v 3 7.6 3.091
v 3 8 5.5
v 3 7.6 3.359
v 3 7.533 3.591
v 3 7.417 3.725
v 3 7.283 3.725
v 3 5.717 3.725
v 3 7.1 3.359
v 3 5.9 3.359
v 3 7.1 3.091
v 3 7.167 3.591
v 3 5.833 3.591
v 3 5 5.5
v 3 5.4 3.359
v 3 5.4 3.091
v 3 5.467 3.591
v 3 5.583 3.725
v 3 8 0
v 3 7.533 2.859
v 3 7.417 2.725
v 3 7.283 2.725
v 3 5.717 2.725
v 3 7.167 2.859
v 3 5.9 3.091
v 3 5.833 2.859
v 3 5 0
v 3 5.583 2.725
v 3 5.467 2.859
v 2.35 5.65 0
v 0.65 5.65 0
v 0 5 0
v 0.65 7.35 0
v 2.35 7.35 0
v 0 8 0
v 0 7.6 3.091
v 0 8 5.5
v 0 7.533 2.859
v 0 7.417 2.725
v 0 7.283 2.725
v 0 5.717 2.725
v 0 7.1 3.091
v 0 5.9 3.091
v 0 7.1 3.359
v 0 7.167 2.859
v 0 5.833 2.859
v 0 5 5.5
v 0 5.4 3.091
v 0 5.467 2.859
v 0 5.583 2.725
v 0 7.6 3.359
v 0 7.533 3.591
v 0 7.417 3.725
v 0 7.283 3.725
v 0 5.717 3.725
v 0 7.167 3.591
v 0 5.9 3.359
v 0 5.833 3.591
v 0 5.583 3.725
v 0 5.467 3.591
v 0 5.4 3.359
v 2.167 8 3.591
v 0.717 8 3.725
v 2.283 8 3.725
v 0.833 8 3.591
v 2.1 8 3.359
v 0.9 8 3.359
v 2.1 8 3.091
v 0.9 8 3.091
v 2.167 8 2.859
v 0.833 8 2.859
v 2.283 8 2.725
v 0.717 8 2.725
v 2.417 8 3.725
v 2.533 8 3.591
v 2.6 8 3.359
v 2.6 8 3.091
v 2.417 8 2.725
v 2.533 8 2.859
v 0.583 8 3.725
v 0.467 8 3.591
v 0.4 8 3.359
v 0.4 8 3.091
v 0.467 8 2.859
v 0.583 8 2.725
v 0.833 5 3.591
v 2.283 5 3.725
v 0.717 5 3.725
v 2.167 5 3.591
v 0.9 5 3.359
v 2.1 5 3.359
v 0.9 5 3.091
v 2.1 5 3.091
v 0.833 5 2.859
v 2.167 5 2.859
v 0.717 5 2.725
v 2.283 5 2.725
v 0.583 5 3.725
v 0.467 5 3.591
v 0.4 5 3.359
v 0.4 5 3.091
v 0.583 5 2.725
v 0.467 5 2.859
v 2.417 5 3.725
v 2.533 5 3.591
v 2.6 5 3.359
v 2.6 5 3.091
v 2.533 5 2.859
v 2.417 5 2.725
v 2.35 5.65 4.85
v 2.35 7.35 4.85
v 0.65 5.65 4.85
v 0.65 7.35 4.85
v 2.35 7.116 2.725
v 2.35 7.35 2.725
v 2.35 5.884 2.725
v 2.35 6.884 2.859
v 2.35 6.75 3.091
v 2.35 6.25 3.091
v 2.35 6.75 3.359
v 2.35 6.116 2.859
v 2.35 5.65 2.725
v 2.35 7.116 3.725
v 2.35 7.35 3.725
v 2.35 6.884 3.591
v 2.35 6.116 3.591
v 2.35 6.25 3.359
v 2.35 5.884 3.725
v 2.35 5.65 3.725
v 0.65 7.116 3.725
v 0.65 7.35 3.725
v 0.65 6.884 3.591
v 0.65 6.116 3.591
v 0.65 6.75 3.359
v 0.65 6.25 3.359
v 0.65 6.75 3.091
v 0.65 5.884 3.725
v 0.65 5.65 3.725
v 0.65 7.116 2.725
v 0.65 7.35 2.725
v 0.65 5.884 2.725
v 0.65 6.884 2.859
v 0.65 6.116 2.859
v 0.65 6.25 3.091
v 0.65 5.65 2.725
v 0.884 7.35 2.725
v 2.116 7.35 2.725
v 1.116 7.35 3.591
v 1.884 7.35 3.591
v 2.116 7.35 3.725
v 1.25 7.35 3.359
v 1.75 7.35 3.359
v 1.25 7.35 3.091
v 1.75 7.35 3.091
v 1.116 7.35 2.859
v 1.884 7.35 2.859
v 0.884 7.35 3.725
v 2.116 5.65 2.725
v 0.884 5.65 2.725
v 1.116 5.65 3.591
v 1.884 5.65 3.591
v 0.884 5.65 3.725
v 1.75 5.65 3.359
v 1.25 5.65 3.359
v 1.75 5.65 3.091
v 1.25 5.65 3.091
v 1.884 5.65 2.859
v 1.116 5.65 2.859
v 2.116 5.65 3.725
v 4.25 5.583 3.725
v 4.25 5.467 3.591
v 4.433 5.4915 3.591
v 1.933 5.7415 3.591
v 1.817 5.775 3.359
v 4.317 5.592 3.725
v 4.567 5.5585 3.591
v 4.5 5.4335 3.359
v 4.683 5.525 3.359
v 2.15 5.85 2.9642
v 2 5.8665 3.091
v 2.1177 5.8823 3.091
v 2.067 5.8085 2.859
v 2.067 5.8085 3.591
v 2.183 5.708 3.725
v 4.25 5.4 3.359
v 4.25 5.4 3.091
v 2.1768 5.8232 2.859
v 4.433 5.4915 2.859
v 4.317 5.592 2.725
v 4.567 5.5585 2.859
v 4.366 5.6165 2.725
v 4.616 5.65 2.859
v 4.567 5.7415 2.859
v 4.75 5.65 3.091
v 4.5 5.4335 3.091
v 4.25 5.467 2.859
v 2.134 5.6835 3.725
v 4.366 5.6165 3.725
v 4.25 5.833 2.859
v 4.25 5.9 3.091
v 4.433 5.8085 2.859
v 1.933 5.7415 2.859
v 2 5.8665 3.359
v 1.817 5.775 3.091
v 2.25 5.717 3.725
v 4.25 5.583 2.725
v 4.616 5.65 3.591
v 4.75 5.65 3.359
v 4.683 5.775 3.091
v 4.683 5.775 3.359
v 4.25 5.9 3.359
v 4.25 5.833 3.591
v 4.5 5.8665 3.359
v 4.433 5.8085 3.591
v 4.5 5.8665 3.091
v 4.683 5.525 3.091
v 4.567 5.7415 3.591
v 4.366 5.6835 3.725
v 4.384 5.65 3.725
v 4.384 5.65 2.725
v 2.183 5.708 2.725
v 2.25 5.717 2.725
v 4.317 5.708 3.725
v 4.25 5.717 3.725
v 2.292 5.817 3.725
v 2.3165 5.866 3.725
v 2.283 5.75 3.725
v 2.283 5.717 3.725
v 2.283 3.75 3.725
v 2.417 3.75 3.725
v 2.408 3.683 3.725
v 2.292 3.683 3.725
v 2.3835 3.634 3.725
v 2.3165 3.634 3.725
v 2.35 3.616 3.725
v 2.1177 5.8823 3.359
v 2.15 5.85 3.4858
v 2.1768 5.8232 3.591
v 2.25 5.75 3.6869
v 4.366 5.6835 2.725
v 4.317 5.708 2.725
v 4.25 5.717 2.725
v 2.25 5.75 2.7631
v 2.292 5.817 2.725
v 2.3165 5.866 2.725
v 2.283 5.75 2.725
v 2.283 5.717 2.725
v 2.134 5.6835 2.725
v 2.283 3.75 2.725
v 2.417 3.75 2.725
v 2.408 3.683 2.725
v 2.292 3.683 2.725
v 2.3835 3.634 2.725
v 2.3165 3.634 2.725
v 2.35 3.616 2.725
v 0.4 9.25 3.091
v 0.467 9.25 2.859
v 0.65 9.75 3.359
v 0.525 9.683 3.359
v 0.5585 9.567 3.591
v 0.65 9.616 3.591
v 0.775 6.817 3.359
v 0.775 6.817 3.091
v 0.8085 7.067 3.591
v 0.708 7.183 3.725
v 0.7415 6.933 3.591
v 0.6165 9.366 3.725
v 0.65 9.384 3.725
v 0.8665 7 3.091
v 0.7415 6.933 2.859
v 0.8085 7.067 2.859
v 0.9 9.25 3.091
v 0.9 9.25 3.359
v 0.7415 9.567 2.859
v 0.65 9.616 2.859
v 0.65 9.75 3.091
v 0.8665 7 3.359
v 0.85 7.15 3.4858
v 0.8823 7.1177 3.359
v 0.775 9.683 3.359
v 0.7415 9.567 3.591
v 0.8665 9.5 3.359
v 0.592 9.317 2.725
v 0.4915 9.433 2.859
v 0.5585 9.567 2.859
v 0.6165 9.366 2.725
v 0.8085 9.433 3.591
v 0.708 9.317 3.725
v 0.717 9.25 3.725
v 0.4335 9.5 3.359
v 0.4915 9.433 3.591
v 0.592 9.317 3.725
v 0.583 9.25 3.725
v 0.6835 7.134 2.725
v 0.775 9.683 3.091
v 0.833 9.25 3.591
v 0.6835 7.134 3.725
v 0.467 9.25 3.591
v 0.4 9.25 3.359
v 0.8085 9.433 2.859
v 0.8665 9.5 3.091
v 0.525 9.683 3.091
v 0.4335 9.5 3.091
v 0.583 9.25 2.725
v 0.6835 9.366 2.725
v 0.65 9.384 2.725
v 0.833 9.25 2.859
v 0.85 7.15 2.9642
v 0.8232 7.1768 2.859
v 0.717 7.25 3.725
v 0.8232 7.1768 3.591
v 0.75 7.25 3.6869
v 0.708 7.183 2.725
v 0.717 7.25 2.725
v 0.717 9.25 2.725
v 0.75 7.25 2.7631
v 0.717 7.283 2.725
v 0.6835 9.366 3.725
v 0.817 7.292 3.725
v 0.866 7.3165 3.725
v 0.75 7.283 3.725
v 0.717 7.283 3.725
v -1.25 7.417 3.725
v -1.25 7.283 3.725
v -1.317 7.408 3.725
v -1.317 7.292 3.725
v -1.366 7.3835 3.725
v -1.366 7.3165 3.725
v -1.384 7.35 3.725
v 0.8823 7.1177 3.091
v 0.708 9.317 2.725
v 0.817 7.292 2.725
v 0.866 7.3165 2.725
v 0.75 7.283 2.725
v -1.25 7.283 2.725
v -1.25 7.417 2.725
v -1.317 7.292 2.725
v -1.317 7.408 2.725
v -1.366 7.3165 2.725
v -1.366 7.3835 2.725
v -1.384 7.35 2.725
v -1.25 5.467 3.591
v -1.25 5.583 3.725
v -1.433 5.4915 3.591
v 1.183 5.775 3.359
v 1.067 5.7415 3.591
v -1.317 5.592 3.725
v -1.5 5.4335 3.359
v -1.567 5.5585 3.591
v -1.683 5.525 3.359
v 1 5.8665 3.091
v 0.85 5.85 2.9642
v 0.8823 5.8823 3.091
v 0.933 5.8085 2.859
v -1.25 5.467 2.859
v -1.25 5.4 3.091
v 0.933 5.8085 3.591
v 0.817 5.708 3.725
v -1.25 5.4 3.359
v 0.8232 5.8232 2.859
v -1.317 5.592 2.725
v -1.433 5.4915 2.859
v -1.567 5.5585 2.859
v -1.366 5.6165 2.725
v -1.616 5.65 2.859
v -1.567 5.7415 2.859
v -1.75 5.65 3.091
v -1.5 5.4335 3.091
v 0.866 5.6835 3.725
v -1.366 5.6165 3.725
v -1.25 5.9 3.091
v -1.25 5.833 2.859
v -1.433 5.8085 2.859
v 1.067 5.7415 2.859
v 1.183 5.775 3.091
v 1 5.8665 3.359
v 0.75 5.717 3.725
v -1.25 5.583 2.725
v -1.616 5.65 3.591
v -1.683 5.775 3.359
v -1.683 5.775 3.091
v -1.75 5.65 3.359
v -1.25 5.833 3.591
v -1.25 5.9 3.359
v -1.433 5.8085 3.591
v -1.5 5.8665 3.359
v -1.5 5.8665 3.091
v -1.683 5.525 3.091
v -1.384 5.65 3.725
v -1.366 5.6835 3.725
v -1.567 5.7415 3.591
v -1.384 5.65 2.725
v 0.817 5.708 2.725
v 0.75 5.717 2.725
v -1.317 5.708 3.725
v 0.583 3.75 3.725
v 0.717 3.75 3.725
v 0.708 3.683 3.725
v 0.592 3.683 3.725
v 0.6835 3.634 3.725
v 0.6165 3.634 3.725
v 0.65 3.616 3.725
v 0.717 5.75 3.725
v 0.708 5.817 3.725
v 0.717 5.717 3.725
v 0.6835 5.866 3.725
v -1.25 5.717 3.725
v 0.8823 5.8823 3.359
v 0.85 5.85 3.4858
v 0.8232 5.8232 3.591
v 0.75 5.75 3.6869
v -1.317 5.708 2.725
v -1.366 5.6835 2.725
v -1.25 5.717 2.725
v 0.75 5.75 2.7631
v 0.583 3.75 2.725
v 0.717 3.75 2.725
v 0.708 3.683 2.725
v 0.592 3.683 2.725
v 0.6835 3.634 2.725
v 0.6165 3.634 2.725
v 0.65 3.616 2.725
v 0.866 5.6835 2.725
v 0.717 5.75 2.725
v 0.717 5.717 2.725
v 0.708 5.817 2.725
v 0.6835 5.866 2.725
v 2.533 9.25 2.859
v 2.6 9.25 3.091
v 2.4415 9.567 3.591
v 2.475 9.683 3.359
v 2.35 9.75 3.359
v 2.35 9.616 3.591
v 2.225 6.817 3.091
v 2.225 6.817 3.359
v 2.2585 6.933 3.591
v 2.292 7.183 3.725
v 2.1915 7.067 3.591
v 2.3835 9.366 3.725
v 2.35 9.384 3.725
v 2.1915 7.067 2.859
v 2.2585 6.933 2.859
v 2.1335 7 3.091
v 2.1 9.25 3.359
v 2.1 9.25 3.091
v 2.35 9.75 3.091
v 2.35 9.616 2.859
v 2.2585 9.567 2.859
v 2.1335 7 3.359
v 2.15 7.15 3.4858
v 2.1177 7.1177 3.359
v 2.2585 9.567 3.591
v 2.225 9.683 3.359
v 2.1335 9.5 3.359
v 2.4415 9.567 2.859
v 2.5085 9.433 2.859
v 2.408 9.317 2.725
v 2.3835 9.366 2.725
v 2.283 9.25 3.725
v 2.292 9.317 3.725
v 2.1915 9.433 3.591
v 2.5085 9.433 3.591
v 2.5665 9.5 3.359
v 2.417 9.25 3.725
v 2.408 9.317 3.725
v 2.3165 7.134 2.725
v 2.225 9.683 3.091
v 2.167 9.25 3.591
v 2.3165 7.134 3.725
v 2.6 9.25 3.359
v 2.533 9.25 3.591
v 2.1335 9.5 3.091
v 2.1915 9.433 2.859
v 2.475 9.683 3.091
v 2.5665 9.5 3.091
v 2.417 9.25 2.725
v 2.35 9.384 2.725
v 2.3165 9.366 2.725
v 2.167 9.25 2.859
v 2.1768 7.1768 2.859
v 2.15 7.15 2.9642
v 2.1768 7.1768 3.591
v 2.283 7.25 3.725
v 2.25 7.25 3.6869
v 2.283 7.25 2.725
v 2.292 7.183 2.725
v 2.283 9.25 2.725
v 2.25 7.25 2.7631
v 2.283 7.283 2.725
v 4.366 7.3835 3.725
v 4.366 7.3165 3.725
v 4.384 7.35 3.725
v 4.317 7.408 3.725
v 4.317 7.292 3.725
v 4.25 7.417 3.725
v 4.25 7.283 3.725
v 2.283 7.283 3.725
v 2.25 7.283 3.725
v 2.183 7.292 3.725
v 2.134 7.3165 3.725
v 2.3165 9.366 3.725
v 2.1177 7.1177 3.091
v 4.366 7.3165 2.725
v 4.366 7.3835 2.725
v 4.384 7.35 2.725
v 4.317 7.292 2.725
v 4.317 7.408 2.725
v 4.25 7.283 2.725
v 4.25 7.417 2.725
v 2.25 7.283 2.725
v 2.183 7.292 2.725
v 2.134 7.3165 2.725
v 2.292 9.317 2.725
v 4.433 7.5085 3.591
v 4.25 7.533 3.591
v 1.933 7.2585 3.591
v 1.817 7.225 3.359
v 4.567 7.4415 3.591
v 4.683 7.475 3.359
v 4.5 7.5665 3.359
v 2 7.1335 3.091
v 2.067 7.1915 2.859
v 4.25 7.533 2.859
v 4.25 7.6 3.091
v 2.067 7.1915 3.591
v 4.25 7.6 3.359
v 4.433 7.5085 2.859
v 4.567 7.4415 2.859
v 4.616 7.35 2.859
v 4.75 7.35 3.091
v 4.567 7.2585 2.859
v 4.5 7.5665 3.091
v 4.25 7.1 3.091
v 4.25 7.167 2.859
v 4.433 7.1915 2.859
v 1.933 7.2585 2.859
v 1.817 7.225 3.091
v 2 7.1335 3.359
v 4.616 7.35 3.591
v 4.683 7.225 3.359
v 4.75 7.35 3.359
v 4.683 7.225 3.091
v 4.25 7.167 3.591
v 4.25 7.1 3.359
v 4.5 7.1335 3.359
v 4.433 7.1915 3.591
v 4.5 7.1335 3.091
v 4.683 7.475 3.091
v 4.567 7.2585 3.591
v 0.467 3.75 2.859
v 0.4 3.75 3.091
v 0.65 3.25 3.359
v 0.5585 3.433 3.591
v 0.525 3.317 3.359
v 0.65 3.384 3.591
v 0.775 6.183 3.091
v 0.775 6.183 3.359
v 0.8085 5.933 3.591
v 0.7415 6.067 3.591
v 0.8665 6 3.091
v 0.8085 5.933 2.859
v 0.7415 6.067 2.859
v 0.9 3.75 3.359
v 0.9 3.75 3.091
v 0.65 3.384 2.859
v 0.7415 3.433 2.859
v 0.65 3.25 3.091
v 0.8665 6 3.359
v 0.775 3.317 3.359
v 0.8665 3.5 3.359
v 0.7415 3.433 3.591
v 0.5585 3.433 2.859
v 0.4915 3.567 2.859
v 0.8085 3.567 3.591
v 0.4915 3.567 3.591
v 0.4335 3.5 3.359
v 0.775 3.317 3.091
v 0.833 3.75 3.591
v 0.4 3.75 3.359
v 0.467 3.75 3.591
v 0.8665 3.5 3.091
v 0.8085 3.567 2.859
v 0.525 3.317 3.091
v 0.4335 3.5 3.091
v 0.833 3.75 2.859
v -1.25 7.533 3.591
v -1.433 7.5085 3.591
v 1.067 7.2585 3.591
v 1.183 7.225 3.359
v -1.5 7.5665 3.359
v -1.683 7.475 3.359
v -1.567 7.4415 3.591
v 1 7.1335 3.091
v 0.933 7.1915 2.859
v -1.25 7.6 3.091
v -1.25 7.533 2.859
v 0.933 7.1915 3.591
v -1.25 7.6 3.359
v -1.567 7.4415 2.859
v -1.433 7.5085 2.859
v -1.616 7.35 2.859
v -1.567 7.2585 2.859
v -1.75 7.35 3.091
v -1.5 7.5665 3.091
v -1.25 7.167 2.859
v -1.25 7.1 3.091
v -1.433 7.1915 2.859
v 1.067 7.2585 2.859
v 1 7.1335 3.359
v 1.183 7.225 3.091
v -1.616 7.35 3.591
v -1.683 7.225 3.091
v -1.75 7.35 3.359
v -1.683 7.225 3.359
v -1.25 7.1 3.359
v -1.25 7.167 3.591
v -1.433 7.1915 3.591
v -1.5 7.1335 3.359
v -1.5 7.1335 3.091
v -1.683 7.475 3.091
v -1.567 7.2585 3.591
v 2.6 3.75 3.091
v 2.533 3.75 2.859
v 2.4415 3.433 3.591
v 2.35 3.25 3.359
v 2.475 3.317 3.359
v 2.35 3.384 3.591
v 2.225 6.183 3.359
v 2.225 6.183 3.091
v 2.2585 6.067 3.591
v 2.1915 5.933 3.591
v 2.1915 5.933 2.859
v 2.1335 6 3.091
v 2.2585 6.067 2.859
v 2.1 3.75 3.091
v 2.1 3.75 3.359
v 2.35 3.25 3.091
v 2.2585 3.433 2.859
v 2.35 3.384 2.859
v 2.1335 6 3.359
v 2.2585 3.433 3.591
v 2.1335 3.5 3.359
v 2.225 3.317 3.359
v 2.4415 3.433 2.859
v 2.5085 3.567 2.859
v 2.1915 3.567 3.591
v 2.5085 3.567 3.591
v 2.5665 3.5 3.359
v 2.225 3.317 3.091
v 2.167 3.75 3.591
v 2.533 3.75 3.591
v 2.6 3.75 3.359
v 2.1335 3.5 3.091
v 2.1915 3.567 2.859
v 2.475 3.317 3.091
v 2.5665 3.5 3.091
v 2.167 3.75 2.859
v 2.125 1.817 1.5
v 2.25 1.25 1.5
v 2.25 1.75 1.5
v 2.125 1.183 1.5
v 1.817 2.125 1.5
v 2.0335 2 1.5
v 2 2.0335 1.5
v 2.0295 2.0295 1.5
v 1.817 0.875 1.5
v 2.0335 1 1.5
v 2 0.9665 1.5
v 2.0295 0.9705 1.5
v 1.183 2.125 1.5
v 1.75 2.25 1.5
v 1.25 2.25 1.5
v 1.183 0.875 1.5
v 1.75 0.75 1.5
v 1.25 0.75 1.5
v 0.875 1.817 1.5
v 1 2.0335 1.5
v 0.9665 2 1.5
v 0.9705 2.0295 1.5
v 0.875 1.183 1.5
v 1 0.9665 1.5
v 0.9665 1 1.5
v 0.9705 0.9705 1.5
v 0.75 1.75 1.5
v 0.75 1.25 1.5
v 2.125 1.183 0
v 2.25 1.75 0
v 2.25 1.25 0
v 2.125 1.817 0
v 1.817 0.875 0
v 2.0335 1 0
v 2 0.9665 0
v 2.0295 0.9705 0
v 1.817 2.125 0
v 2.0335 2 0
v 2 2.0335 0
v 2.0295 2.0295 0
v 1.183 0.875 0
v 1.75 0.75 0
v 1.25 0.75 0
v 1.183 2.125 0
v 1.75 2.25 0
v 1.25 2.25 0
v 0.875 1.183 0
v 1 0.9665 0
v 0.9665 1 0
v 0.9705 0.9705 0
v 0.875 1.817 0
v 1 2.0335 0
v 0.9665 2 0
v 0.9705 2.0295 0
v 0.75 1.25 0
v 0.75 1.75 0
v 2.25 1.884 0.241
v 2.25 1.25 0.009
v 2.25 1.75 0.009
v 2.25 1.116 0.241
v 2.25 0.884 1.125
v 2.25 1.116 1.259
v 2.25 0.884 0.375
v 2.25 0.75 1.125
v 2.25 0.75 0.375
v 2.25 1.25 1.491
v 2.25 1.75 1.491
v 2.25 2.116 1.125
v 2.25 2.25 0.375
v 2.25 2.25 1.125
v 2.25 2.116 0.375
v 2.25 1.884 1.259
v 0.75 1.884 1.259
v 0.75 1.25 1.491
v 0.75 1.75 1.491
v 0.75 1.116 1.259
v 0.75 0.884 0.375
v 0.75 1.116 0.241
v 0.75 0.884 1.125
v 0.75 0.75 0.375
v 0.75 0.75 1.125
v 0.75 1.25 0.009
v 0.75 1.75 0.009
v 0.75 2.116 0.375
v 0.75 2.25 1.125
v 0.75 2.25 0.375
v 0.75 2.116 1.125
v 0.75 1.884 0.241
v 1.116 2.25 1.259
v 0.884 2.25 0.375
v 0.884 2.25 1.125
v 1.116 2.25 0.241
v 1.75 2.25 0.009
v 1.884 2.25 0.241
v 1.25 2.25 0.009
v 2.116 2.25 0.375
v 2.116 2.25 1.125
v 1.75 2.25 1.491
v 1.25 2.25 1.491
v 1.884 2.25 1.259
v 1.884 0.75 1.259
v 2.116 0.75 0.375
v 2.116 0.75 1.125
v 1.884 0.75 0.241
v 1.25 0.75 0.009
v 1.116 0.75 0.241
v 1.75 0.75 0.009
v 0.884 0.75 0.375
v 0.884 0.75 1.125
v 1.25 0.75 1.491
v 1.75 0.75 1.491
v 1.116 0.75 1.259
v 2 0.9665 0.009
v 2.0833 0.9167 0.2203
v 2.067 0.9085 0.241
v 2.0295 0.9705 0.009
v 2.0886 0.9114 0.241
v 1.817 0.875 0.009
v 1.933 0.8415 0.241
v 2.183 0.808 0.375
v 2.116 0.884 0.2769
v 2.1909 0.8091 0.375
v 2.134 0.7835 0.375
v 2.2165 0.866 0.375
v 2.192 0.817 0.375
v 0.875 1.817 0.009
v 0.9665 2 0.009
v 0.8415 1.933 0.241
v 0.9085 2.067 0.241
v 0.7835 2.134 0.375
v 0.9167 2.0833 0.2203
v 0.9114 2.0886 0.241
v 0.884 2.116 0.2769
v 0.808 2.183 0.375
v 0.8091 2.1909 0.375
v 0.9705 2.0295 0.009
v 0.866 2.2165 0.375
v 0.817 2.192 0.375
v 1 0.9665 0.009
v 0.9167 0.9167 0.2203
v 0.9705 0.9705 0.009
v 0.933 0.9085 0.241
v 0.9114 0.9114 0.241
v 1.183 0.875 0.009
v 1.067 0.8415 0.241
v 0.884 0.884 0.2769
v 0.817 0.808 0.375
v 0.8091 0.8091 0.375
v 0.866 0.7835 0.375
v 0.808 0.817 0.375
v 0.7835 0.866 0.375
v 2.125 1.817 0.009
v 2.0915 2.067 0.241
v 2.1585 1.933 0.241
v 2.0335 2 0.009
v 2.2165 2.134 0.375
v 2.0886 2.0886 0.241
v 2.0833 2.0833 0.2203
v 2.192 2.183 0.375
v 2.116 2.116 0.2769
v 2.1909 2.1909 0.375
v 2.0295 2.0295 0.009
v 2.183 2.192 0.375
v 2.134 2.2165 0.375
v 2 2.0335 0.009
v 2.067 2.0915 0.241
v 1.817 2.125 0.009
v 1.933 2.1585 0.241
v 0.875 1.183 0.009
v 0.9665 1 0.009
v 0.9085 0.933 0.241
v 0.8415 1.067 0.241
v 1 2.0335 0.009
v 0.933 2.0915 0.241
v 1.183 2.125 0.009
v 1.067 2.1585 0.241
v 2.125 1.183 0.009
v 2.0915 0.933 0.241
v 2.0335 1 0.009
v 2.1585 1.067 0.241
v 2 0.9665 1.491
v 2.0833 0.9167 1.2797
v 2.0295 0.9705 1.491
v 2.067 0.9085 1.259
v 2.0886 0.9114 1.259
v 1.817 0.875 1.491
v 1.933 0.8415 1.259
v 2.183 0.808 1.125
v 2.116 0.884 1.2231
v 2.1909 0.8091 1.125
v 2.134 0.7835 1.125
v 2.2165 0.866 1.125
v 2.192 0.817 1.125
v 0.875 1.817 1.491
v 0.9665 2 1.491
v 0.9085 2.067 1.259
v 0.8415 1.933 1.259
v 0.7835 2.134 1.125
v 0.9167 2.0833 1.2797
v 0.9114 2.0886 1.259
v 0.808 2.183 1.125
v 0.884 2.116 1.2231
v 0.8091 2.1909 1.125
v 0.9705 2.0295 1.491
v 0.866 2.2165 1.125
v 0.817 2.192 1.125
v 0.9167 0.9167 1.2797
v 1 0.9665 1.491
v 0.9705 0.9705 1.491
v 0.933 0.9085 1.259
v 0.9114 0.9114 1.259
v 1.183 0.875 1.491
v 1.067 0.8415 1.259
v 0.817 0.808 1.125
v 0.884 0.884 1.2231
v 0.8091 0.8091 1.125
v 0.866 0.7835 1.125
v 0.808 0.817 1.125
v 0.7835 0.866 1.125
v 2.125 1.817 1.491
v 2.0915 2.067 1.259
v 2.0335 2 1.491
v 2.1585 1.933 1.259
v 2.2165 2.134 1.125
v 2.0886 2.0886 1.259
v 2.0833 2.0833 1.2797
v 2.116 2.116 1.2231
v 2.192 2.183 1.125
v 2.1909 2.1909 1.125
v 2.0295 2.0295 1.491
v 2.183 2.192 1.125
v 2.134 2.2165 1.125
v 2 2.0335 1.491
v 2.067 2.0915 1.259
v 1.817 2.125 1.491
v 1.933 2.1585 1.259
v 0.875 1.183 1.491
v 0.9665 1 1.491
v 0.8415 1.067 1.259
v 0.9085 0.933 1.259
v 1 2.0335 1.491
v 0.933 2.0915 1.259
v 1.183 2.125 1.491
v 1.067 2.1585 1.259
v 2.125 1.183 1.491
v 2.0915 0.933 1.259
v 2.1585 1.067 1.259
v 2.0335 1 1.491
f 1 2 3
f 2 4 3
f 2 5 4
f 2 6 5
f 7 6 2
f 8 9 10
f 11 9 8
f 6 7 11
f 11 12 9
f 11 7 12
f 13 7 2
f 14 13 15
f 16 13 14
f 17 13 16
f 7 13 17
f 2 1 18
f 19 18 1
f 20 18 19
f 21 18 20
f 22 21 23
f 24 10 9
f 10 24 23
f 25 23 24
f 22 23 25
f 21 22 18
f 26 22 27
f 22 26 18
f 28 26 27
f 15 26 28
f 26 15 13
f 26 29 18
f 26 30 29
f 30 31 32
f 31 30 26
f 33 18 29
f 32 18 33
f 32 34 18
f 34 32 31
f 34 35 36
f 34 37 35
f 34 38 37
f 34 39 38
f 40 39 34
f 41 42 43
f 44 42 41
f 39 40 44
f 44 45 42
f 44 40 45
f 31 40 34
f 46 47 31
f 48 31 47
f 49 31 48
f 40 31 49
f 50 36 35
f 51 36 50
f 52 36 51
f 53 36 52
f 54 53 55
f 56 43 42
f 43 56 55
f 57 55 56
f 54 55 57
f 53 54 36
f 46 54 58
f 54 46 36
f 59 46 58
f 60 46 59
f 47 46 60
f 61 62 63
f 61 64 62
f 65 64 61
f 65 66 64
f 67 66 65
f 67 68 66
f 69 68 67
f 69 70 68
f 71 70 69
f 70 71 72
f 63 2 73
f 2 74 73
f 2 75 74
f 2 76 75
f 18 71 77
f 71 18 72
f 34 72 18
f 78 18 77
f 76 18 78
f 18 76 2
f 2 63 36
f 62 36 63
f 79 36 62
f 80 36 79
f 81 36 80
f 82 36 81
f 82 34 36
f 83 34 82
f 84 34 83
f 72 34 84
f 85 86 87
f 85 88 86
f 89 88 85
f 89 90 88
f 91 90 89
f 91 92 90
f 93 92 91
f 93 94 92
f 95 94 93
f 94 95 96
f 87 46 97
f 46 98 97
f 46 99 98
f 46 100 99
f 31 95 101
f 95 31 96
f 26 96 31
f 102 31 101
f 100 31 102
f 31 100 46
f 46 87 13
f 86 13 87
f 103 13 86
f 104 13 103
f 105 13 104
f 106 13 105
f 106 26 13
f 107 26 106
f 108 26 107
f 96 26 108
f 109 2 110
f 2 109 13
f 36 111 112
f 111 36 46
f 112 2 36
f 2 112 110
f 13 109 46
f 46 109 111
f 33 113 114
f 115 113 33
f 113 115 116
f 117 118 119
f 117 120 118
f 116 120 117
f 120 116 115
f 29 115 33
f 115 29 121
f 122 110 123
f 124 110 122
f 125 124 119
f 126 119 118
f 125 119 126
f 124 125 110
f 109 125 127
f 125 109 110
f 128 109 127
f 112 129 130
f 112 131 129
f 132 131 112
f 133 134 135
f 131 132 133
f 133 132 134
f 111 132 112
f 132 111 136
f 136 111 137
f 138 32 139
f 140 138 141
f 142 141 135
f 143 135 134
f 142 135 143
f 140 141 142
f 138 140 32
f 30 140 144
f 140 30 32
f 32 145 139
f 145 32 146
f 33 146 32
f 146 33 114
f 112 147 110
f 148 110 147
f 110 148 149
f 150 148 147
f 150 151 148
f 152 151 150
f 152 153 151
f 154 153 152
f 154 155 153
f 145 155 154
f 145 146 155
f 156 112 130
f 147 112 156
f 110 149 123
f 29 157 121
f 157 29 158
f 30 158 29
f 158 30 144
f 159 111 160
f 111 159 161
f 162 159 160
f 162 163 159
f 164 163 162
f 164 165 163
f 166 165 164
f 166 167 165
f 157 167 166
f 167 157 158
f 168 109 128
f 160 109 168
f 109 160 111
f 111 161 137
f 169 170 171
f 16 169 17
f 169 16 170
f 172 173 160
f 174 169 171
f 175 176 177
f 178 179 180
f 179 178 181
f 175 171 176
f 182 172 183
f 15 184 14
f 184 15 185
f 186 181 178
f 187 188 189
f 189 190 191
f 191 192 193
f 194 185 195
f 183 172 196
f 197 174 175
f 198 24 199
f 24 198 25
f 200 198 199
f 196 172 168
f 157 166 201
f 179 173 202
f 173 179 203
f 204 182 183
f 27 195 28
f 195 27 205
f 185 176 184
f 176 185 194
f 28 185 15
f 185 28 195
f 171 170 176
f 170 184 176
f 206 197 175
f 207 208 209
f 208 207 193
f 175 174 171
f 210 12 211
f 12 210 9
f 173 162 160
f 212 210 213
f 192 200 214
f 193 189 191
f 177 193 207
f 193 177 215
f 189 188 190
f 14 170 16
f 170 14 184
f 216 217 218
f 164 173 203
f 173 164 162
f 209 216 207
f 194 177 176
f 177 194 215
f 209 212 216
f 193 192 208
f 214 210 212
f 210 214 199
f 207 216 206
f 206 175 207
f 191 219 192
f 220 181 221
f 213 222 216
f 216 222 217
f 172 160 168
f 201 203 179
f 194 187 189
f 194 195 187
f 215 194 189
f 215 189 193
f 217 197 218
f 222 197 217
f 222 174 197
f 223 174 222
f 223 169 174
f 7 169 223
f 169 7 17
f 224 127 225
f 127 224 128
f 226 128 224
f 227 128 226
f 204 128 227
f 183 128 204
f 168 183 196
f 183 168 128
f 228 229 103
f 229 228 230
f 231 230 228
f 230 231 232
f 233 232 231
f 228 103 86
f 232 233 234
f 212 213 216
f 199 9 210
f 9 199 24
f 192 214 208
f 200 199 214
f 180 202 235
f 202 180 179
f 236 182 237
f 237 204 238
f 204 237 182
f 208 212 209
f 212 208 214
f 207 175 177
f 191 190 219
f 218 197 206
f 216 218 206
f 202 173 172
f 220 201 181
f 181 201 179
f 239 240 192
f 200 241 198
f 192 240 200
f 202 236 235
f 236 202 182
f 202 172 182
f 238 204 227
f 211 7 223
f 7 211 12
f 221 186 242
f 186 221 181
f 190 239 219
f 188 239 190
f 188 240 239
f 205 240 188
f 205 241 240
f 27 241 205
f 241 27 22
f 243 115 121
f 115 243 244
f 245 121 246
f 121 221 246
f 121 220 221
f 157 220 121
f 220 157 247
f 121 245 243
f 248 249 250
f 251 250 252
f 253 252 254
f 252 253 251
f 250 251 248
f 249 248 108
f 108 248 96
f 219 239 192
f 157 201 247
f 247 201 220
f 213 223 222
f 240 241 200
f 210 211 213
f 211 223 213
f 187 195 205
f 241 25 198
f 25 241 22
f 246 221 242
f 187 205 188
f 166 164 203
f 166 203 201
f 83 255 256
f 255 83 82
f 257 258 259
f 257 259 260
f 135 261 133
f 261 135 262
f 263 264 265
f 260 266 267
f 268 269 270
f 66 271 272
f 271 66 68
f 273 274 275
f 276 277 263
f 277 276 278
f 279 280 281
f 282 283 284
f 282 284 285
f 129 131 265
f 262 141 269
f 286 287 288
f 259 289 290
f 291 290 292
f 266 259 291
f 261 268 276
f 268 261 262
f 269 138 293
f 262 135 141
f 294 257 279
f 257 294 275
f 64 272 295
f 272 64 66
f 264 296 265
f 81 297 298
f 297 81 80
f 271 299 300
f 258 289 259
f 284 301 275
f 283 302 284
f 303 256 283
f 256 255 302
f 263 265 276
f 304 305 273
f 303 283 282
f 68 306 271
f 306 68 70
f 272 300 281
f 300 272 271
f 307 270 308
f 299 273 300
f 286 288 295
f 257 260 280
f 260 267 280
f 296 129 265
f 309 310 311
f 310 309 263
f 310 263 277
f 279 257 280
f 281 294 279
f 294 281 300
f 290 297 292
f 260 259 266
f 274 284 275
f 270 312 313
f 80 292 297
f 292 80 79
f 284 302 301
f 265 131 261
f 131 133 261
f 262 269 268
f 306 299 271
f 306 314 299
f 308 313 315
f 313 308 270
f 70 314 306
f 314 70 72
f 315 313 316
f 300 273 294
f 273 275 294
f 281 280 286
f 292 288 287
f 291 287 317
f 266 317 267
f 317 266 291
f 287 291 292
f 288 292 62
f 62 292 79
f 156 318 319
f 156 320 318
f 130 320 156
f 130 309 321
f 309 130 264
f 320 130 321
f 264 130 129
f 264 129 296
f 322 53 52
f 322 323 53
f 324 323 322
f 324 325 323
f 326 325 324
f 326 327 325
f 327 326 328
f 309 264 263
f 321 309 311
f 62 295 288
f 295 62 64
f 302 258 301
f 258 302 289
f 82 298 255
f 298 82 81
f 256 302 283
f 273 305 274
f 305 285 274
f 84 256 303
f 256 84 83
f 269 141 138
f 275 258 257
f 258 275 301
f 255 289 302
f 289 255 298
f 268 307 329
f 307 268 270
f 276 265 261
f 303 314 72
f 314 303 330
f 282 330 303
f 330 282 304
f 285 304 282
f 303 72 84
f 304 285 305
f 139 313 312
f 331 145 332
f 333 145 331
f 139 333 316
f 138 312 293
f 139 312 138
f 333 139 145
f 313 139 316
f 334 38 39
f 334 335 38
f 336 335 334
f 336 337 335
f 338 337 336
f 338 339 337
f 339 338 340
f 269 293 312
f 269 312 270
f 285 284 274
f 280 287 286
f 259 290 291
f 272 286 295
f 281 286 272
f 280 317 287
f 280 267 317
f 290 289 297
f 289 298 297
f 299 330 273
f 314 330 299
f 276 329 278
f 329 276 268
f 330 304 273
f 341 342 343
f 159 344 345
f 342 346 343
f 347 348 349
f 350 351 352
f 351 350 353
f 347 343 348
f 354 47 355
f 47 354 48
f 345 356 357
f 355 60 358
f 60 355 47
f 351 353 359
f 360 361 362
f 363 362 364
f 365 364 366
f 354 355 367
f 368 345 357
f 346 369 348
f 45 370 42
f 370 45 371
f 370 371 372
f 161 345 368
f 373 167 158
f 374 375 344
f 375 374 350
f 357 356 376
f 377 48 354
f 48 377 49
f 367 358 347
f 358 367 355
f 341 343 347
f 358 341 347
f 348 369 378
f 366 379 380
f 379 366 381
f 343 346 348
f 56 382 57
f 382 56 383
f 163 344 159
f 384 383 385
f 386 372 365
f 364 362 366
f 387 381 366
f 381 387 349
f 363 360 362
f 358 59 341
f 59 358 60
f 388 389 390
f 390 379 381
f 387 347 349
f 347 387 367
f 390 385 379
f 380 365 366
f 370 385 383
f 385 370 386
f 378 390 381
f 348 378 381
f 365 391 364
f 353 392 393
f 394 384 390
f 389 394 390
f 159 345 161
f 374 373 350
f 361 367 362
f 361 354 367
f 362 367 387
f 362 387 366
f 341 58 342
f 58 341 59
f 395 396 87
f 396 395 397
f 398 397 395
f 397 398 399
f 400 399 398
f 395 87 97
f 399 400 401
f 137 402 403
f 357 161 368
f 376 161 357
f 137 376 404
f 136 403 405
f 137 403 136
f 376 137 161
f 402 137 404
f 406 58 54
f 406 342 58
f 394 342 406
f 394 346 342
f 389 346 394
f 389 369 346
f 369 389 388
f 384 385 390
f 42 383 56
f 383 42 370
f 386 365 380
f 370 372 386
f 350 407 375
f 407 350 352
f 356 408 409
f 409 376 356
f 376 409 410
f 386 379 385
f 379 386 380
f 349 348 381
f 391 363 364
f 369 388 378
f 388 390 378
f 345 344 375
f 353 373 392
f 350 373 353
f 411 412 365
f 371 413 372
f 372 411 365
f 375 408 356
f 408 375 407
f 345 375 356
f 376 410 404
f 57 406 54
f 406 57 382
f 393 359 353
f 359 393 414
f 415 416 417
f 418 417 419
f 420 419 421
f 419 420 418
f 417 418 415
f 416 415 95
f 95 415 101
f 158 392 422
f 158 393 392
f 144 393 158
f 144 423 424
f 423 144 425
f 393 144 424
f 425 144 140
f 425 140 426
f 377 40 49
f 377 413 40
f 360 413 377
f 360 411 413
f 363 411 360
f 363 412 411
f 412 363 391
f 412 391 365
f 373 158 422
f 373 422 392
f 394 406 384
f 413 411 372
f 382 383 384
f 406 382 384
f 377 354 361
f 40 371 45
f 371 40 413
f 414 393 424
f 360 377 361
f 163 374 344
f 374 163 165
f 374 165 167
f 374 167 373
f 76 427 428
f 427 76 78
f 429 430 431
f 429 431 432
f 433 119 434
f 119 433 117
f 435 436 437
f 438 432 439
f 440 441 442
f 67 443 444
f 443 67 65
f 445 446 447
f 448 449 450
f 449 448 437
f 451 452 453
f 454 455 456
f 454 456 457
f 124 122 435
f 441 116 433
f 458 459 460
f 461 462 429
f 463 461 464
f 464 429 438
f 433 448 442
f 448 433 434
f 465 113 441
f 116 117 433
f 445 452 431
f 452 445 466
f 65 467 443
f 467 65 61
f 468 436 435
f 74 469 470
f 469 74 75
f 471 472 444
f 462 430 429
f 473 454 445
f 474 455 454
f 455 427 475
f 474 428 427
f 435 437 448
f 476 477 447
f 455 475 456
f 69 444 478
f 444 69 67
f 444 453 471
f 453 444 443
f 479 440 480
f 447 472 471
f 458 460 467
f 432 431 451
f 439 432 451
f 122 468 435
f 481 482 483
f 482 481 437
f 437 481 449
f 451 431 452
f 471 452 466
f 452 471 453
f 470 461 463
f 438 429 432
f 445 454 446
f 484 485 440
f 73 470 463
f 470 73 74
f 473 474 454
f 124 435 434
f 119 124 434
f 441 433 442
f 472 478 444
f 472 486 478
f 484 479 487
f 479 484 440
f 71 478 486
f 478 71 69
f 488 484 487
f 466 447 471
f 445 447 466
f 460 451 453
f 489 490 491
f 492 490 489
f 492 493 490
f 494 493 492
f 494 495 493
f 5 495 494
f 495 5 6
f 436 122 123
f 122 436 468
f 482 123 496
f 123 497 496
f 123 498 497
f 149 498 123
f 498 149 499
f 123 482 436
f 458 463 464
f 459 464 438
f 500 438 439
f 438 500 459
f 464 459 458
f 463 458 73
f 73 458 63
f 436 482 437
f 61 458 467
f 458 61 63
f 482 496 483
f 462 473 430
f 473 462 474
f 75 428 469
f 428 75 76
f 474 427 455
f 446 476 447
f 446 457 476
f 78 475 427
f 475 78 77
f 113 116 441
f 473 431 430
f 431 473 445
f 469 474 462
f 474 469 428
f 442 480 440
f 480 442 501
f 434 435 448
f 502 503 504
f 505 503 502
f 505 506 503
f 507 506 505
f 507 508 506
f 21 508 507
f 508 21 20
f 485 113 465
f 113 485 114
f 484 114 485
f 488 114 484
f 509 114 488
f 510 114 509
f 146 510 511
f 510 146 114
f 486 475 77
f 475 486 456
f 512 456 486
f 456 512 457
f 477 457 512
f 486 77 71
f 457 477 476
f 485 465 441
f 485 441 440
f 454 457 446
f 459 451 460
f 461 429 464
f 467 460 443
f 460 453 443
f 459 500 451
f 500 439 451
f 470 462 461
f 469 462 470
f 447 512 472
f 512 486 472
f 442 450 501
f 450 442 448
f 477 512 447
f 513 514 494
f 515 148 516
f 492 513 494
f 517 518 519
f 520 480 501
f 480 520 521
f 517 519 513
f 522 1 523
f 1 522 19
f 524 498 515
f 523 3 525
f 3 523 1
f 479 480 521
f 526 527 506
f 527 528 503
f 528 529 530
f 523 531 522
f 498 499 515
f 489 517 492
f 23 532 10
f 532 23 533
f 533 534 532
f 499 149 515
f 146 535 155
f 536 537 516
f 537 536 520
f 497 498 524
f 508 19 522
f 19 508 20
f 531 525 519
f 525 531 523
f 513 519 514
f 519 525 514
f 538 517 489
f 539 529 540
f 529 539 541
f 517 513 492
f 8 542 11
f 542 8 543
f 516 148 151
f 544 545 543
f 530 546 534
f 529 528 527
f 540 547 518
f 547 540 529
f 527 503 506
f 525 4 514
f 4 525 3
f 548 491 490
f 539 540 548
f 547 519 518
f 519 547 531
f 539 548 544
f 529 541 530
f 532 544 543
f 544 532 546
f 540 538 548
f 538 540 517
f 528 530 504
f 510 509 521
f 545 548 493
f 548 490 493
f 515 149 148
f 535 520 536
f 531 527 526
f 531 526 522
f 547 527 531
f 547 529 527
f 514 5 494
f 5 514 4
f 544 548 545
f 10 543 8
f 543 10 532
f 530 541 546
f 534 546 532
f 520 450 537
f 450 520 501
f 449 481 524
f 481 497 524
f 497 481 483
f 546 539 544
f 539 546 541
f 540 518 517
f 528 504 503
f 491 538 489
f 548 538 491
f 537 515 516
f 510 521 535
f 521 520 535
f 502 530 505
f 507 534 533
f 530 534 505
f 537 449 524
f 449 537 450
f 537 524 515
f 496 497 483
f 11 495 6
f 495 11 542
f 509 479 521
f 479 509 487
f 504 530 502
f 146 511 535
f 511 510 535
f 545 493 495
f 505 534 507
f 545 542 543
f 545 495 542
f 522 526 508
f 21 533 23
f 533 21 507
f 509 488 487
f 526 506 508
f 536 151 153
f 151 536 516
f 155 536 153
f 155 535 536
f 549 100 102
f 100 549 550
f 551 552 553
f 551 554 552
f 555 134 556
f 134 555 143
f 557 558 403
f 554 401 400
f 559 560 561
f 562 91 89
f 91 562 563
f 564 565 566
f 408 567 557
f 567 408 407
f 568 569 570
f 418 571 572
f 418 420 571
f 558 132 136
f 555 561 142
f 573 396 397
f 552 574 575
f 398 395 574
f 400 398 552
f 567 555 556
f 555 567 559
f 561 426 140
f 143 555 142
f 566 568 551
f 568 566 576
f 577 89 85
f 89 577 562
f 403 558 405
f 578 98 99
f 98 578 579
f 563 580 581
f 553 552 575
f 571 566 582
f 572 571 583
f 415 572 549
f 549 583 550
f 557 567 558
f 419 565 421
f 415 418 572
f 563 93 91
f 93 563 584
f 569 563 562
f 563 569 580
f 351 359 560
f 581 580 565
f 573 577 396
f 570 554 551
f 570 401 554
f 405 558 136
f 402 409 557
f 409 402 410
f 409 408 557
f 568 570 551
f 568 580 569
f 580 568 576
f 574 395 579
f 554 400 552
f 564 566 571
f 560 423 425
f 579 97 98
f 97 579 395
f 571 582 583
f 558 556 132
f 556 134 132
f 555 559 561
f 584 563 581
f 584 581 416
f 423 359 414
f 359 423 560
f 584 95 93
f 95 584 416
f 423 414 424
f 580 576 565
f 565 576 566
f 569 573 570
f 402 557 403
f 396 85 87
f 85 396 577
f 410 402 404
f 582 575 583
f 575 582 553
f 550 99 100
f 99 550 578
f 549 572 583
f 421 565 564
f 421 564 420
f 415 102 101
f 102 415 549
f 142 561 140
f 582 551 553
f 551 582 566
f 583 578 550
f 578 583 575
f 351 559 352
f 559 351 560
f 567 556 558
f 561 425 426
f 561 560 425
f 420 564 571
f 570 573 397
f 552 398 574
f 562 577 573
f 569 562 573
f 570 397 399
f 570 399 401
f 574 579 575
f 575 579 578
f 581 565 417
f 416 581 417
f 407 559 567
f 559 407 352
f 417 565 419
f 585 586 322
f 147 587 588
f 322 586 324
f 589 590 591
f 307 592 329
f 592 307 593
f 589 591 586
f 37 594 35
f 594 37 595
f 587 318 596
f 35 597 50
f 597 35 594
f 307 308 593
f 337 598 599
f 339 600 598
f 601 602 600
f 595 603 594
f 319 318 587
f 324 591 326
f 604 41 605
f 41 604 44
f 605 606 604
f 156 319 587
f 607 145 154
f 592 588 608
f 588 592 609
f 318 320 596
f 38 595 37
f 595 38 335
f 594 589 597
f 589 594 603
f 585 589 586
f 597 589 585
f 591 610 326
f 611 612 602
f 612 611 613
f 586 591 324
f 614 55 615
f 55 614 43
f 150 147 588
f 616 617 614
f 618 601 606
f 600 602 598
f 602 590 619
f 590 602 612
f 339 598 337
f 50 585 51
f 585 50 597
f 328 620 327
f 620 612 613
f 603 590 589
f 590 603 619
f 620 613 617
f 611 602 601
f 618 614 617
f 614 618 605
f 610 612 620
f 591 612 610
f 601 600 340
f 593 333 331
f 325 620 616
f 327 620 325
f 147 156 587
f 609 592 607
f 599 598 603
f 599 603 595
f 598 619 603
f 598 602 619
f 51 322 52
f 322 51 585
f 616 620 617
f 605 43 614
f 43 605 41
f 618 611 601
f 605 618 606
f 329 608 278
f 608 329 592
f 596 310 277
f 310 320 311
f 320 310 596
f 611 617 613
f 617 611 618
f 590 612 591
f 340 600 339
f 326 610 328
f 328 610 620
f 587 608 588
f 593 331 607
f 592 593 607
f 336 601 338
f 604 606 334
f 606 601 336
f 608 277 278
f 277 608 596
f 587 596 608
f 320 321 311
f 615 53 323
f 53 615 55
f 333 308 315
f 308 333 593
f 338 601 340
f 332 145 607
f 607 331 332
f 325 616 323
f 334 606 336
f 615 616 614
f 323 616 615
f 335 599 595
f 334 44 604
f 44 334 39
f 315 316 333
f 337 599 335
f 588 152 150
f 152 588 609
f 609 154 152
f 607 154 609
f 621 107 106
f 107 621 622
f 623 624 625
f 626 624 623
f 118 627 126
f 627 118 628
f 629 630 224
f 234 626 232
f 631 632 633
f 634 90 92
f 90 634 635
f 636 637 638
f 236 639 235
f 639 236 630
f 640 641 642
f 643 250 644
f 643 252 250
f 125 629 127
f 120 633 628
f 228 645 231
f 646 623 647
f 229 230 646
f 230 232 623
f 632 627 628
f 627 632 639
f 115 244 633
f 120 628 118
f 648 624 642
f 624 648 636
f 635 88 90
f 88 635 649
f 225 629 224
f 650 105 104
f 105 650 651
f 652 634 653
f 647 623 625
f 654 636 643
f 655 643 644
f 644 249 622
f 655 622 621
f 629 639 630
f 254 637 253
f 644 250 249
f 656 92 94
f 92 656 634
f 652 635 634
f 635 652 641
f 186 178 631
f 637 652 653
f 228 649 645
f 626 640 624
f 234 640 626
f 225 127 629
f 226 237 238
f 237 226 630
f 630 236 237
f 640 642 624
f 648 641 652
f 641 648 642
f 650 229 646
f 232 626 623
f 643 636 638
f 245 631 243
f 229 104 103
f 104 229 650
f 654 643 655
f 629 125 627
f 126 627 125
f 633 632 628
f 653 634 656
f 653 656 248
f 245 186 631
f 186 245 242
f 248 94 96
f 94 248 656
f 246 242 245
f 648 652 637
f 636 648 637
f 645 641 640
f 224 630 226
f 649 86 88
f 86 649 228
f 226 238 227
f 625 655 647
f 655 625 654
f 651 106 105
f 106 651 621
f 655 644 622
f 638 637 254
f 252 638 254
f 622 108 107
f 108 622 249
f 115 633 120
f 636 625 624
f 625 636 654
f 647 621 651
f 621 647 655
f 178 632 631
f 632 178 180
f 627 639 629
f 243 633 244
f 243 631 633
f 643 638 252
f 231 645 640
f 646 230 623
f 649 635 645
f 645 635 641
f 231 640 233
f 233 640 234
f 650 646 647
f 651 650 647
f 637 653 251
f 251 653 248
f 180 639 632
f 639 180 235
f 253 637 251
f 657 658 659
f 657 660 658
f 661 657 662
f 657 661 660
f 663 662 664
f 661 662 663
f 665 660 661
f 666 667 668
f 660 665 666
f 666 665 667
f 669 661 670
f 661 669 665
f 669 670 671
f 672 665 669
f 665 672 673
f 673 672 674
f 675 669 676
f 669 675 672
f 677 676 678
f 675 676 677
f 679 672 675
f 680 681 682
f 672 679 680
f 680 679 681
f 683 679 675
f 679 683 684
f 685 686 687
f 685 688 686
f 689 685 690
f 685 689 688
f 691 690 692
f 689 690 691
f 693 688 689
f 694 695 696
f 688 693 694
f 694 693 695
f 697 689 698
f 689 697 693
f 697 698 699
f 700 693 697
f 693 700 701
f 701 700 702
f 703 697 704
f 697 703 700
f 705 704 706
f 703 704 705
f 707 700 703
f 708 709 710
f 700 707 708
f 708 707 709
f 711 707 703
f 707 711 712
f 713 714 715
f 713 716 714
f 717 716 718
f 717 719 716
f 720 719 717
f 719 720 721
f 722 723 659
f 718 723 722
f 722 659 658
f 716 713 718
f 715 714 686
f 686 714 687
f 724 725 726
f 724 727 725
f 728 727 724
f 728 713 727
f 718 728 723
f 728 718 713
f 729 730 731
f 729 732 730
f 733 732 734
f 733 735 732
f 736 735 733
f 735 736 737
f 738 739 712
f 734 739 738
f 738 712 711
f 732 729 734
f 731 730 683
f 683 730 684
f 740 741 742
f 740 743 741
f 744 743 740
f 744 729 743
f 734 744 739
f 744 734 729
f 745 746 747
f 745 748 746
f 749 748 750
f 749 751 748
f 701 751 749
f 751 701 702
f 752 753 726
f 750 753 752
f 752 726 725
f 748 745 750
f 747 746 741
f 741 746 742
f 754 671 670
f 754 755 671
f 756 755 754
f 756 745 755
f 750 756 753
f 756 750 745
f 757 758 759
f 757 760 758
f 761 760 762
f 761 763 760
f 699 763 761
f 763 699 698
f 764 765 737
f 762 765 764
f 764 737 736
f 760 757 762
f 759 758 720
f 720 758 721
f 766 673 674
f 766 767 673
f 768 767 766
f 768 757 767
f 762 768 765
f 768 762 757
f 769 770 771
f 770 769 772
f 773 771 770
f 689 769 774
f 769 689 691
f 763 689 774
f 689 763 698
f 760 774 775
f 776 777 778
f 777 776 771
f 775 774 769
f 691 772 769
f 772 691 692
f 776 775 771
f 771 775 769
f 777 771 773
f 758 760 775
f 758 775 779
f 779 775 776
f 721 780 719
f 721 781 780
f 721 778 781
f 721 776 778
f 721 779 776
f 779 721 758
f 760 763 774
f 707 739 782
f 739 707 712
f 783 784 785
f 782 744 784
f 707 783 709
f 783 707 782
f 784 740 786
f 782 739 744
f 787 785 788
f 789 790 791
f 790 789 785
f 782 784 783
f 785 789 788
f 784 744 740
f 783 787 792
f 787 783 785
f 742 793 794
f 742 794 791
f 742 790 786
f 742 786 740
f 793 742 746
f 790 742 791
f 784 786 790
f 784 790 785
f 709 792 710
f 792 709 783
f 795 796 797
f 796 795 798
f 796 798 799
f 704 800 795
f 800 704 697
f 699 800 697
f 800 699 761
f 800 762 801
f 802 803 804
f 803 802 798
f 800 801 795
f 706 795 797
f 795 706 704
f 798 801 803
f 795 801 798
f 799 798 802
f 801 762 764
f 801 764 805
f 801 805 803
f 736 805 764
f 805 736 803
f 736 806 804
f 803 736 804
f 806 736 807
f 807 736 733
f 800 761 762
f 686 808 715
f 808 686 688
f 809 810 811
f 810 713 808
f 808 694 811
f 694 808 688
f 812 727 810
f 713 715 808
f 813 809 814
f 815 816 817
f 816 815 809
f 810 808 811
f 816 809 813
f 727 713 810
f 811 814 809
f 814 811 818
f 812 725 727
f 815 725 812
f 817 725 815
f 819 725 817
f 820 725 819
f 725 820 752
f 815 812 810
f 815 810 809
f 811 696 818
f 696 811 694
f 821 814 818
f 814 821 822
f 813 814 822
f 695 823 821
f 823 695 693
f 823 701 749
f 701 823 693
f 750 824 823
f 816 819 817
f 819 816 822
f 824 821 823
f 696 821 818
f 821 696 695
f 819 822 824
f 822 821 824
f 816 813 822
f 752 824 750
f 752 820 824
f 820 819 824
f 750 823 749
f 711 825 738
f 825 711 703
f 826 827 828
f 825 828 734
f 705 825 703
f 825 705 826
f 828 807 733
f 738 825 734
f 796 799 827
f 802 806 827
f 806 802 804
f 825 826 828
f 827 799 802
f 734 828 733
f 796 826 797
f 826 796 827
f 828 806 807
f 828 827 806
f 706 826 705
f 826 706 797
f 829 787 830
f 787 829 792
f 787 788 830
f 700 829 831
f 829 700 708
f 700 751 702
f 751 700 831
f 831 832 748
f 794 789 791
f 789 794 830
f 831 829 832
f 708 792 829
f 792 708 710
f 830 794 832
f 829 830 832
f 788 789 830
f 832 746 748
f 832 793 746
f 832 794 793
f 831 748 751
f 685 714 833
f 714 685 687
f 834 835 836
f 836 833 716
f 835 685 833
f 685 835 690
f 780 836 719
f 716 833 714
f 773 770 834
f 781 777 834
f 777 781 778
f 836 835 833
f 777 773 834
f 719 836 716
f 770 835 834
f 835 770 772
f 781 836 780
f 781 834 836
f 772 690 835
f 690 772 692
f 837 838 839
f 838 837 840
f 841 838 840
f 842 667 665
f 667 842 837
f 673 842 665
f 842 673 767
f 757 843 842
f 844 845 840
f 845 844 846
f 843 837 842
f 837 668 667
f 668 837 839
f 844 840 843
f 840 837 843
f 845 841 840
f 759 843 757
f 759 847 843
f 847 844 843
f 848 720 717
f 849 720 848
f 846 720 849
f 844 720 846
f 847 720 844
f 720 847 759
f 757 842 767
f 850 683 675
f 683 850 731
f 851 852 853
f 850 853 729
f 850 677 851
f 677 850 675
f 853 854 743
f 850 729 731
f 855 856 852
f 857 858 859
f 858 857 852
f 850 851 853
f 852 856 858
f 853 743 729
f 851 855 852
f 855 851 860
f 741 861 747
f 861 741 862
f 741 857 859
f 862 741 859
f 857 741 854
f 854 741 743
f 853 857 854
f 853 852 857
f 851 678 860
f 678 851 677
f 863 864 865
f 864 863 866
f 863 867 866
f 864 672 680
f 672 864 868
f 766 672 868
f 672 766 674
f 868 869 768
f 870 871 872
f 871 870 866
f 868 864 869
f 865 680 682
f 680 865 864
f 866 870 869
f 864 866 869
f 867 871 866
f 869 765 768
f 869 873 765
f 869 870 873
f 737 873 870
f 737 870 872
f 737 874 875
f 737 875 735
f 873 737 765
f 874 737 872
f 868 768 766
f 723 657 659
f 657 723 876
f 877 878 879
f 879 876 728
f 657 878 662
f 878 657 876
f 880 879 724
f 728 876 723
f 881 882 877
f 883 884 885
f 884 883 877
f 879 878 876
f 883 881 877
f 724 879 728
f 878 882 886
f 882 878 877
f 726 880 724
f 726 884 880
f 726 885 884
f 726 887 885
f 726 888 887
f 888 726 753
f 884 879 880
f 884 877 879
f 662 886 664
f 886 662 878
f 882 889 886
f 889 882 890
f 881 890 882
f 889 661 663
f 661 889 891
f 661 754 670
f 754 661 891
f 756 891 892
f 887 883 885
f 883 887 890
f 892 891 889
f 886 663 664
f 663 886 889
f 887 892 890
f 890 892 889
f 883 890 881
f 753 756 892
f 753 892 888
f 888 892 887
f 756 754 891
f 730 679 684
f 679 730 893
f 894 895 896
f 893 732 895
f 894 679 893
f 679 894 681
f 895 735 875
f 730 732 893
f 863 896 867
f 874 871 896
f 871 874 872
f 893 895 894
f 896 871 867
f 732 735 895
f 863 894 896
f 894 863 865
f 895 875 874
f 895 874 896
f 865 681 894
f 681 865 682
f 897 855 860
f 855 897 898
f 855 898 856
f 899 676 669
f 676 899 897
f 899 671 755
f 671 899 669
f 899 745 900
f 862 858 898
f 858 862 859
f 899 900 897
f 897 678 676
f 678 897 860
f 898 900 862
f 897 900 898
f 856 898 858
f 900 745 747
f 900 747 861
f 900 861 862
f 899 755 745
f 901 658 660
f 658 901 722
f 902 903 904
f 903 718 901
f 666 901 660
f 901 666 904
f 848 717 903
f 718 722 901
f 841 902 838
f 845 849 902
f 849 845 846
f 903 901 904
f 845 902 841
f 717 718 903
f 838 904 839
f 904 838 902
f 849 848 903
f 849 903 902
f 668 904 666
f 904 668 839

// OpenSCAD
// BGSD
include <../lib/boardgame_insert_toolkit_lib.4.scad>;
data = [
    // Source STL: Tokens A.stl
    // STL bbox min [31, -36, 0] max [83, 119, 41] size [52, 155, 41]
    // Detected compartments: 3; wall thickness: 1.5mm
    // Estimated bottom thickness: 0.8mm
    // Inferred side cutouts: left (medium)
    // Inferred external profile cuts: back-right [19, 11]
    // Tokens A cavity 1: SQUARE shape (high, curved ratio 0)
    // Tokens A cavity 2: SQUARE shape (high, curved ratio 0)
    // Tokens A cavity 3: SQUARE shape (high, curved ratio 0)
    // Tokens A profile extension: SQUARE shape (high, curved ratio 0)
    [ OBJECT_BOX,
        [ NAME, "Tokens A" ],
        [ BOX_SIZE_XYZ, [52, 155, 41] ],
        [ BOX_WALL_THICKNESS, 1.5 ],
        [ BOX_NO_LID_B, true ],
        [ BOX_FEATURE,
            [ NAME, "Tokens A cavity 1" ],
            [ FTR_COMPARTMENT_SIZE_XYZ, [49, 47, 39.5] ],
            [ FTR_NUM_COMPARTMENTS_XY, [1, 1] ],
            [ FTR_SHAPE, SQUARE ],
            [ POSITION_XY, [0, 0] ],
            [ FTR_CUTOUT_SIDES_4B, [false, false, true, false] ],
            [ FTR_CUTOUT_TYPE, INTERIOR ],
            [ FTR_CUTOUT_HEIGHT_PCT, 32.162 ],
            [ FTR_CUTOUT_DEPTH_PCT, 25.927 ],
            [ FTR_CUTOUT_WIDTH_PCT, 95 ],
        ],
        [ BOX_FEATURE,
            [ NAME, "Tokens A cavity 2" ],
            [ FTR_COMPARTMENT_SIZE_XYZ, [49, 44.5, 39.5] ],
            [ FTR_NUM_COMPARTMENTS_XY, [1, 1] ],
            [ FTR_SHAPE, SQUARE ],
            [ POSITION_XY, [0, 48.5] ],
            [ FTR_CUTOUT_SIDES_4B, [false, false, true, false] ],
            [ FTR_CUTOUT_TYPE, INTERIOR ],
            [ FTR_CUTOUT_HEIGHT_PCT, 32.162 ],
            [ FTR_CUTOUT_DEPTH_PCT, 25.927 ],
            [ FTR_CUTOUT_WIDTH_PCT, 95 ],
        ],
        [ BOX_FEATURE,
            [ NAME, "Tokens A cavity 3" ],
            [ FTR_COMPARTMENT_SIZE_XYZ, [49, 46.5, 39.5] ],
            [ FTR_NUM_COMPARTMENTS_XY, [1, 1] ],
            [ FTR_SHAPE, SQUARE ],
            [ POSITION_XY, [0, 94.5] ],
            [ FTR_CUTOUT_SIDES_4B, [false, false, true, false] ],
            [ FTR_CUTOUT_TYPE, INTERIOR ],
            [ FTR_CUTOUT_HEIGHT_PCT, 32.162 ],
            [ FTR_CUTOUT_DEPTH_PCT, 25.927 ],
            [ FTR_CUTOUT_WIDTH_PCT, 95 ],
        ],
        [ BOX_FEATURE,
            [ NAME, "Tokens A profile extension" ],
            [ FTR_COMPARTMENT_SIZE_XYZ, [30, 11, 39.5] ],
            [ FTR_NUM_COMPARTMENTS_XY, [1, 1] ],
            [ FTR_SHAPE, SQUARE ],
            [ POSITION_XY, [0, 141] ],
            [ FTR_CUTOUT_SIDES_4B, [false, false, true, false] ],
            [ FTR_CUTOUT_TYPE, INTERIOR ],
            [ FTR_CUTOUT_HEIGHT_PCT, 32.162 ],
            [ FTR_CUTOUT_DEPTH_PCT, 42.347 ],
            [ FTR_CUTOUT_WIDTH_PCT, 90.909 ],
        ],
    ],
];
difference() {
    Make(data);
    // back-right external step
    translate([33, 144, -0.05]) cube([19.05, 11.05, 41.1]);
}
